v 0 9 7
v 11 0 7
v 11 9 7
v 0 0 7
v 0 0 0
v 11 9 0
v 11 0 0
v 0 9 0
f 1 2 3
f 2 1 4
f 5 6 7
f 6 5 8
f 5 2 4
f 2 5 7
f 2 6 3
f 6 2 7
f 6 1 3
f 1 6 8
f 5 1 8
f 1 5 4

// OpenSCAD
// Generated by SolidPython 1.0.1 on 2020-07-29 00:46:55


cube(size = [11, 9, 7]);
/***********************************************
*********      SolidPython code:      **********
************************************************
 
# import packages: SolidPython
from solid import *
from solid.utils import *
from itertools import chain, combinations, permutations


class Resize:

    def __init__(self, scad_file):
        self.scad_file = scad_file
        #self.scad_file = import_scad(scad_file)
        # cone/cylinder param:
        self.r1 = 0
        self.r2 = 0
        self.h = 0
        # rectangular prism param:
        self.w = 0
        self.l = 0
        # ellipse param:
        self.r = 0

    # import OpenScad code (file name corresponds to shape)


    # classify shape + parameters
    def assign(self, param1, param2, param3):
        if self.scad_file == 'cone.scad':
            self.r1 = param1
            self.r2 = param2
            self.h = param3
        elif self.scad_file == 'cylinder.scad':
            self.r1 = param1
            self.r2 = param2
            self.h = param3
        elif self.scad_file == 'rectangularPrism.scad':
            self.h = param1
            self.l = param2
            self.w = param3
        else:
            self.r = param1
            self.h = param2

    # resize parameters
    def iterate(self):
        x = range(3, 20, 2)
        i = 1
        if self.scad_file == 'cone.scad':
            tempList = list(permutations(x, 2))
            for temp in tempList:
                param1 = temp[0]
                param2 = temp[1]
                filepath = 'produced_scad_files/' + 'cone' + str(param1) + '_' + str(param2) + '_' + '.scad'
                scad_render_to_file(cylinder(h=param1, r1=param2, r2=0), filepath)

        elif self.scad_file == 'cylinder.scad':
            tempList = list(permutations(x, 3))
            for temp in tempList:
                param1 = temp[0]
                param2 = temp[1]
                filepath = 'produced_scad_files/' + 'cylinder' + str(param1) + '_' + str(param2) + '_' + '.scad'
                scad_render_to_file(cylinder(h=param1, r1=param2, r2=param2), filepath)

        elif self.scad_file == 'rectangularPrism.scad':
            tempList = list(permutations(x, 3))
            for temp in tempList:
                param1 = temp[0]
                param2 = temp[1]
                param3 = temp[2]
                filepath = 'produced_scad_files/' + 'rectangularPrism' + str(param1) + '_' + str(param2) + '_' + str(
                    param3) + '.scad'
                scad_render_to_file(cube(size=(param1, param2, param3)), filepath)

        elif self.scad_file == 'ellipse.scad':
            tempList = list(permutations(x, 4))
            for temp in tempList:
                param1 = temp[0]
                param2 = temp[1]
                param3 = temp[2]
                param4 = temp[3]
                filepath = 'produced_scad_files/' + 'ellipse' + str(param1) + '_' + str(param2) + '_' + str(param3) + '_' + str(param4) + '.scad'
                scad_render_to_file(scale([param1, param2, param3])(sphere(r=param4)), filepath)

    def render_to_scadfile(self):
        scad_render_to_file(scad, 'example.scad') 
 
************************************************/
